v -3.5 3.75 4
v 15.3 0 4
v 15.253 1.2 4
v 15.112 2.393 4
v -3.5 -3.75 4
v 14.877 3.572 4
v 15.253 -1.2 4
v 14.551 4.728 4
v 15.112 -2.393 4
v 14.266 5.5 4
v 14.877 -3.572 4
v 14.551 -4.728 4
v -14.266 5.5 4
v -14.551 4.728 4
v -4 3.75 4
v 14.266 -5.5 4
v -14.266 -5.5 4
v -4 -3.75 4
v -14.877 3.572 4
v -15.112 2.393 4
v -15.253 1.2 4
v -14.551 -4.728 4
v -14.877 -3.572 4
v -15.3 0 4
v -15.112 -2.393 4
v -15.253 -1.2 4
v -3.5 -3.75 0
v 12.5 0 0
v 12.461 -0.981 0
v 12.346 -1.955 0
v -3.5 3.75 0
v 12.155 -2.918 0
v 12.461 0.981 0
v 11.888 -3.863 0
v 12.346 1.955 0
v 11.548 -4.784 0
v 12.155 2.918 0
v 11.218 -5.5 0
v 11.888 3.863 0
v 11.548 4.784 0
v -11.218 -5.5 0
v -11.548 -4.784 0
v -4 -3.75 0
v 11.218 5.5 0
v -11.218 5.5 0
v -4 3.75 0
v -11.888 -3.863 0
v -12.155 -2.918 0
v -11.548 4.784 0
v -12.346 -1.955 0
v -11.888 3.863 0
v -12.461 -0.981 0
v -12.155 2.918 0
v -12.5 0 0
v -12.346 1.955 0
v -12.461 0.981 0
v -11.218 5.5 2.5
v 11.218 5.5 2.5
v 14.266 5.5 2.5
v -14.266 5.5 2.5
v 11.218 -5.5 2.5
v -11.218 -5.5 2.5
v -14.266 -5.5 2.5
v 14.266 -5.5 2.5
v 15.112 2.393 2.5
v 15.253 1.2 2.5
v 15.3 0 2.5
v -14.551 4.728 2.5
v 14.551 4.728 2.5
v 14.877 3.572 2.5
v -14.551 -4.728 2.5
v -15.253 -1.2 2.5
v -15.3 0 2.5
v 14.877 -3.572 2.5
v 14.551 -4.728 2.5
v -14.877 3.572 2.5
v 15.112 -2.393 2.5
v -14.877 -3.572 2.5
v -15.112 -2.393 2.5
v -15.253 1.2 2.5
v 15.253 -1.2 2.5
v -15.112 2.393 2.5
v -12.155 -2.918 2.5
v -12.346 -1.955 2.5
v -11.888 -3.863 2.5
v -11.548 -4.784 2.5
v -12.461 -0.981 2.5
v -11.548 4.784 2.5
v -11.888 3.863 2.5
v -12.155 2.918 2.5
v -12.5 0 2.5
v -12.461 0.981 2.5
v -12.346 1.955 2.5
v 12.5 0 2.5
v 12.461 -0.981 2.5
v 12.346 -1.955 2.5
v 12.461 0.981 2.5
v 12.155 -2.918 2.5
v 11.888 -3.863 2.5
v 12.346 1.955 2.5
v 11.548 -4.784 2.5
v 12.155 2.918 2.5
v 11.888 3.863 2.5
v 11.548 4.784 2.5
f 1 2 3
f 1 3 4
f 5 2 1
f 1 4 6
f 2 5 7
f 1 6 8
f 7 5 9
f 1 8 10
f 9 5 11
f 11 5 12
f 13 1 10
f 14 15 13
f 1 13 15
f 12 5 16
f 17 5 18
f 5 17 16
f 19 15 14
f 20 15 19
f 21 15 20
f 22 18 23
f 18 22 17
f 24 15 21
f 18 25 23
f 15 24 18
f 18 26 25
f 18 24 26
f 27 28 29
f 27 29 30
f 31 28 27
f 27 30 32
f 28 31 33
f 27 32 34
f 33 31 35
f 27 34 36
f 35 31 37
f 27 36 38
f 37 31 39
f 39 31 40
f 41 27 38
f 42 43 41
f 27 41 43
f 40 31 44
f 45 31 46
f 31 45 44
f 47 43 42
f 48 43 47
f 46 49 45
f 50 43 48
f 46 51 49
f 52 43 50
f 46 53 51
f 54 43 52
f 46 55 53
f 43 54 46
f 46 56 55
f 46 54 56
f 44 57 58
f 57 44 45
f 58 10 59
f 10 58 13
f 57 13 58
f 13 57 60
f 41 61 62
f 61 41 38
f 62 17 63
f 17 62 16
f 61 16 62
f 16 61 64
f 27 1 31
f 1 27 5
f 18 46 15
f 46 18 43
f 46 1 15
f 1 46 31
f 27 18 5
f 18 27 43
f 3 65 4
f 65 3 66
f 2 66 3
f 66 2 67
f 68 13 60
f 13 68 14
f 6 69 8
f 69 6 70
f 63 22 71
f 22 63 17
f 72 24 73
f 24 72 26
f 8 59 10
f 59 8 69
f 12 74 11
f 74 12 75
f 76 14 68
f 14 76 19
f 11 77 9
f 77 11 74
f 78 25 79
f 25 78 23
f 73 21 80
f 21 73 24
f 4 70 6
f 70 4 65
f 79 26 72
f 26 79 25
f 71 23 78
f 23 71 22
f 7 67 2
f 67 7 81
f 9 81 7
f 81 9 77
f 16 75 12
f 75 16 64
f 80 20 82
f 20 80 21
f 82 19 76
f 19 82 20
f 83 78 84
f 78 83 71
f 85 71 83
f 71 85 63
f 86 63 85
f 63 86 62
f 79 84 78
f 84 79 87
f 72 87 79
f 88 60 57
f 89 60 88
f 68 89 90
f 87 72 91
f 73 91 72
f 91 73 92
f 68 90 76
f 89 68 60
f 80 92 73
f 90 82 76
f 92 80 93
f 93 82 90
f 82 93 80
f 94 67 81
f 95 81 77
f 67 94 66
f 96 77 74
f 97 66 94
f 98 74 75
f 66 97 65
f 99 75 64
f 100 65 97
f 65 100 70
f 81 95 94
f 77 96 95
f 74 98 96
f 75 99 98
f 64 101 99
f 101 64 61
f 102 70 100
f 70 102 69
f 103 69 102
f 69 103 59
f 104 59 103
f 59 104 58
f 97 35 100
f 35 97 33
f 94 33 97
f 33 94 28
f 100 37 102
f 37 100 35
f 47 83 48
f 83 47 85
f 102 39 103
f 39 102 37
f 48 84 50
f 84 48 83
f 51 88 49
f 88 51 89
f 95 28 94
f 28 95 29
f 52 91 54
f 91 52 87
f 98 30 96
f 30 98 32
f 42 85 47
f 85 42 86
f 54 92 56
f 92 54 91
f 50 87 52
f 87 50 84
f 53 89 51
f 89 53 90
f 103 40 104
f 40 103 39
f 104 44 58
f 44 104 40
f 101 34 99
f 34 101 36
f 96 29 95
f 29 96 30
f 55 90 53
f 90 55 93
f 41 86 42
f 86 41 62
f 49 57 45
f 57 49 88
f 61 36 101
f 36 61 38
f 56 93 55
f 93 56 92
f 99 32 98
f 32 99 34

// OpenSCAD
// file: variables.scad
// General

resolution = 80;
delta = 0.2;

// dimensions tubes pvc

rayon_ext_tube_32 = 16;
rayon_int_tube_32 = 13;
epaisseur_tube_32 = rayon_ext_tube_32 - rayon_int_tube_32;

rayon_ext_tube_40 = 20;
rayon_int_tube_40 = 17.5;
epaisseur_tube_40 = rayon_ext_tube_40 - rayon_int_tube_40;

ret32 = rayon_ext_tube_32;
rit32 = rayon_int_tube_32;
ep32  = epaisseur_tube_32;
ret40 = rayon_ext_tube_40;
rit40 = rayon_int_tube_40;
ep40  = epaisseur_tube_40;

// L'embout accueille un tube pvc de 40mm de diamètre.

hauteur_embout = 20;
rayon_int_embout = rayon_ext_tube_40 + delta;
rayon_ext_embout = 24 + delta;

hauteur_butee = 2;
rayon_int_butee = 16;

// Jonction: section de contact entre les deux pièces.

//hauteur du ressort comprimé
hauteur_ressort = 7.5;

rayon_ext_culot = rayon_ext_tube_40 - delta;
rayon_int_culot = 17 - delta;

rayon_ext_spot = 26;

hauteur_jonction = 30;

hauteur_totale = hauteur_jonction + hauteur_embout + hauteur_butee + hauteur_ressort;

profondeur_douille = 12;

largeur_empreinte = 6;

nb_baionette = 3;
rayon_baionette = (largeur_empreinte / 2)*0.95;
// file: common.scad
module tube(hauteur, rayon_exterieur, rayon_interieur, resolution=resolution) {
	difference(){
	  cylinder(hauteur, rayon_exterieur, rayon_exterieur, $fn=resolution);
	  translate([0,0,-1])
	 	  cylinder(hauteur + 2 , rayon_interieur, rayon_interieur, $fn=resolution);
	}
}

module donut(rayon_spheres, rayon_exterieur){
	rotate_extrude(convexity = 10, $fn = resolution)
		translate([rayon_exterieur,0,0])
		circle(r = rayon_spheres, $fn = resolution);
}

module languette() {
  difference(){
    union() {
      translate([5,0,0])
        cylinder(4,5,5, $fn=resolution);
      translate([-2,-5,0])
        cube([7,10,4]);
     }
    translate([5,0,-1])
      cylinder(6,2.4,2.4, $fn=resolution);
  }
}
// main file
include <common.scad>;
include <variables.scad>;

epaisseur_support = 4;

difference() {

  union() {
    support_contact(rit40*2-5);

    intersection(){
      translate([-(rit40*2/2)+1,-5.5,0])
        cube([rit40*2-2,11,epaisseur_support]);
      tube(10, rit40-2-delta, rit40 - 4);
    }
  }

  translate([0,0,-1])
    tube(3.5, rit40-2, rit40 - 5);
}

module support_contact(largeur) {
  largeur_contact = 7.5;
  largeur_support = 11;

  difference(){
    translate([-(largeur/2)+1,-(largeur_support/2),0])
      cube([largeur-2,largeur_support,epaisseur_support]);

    translate([-4,-(largeur_contact/2),-1])
      cube([0.5,largeur_contact,epaisseur_support+2]);
  }
}
